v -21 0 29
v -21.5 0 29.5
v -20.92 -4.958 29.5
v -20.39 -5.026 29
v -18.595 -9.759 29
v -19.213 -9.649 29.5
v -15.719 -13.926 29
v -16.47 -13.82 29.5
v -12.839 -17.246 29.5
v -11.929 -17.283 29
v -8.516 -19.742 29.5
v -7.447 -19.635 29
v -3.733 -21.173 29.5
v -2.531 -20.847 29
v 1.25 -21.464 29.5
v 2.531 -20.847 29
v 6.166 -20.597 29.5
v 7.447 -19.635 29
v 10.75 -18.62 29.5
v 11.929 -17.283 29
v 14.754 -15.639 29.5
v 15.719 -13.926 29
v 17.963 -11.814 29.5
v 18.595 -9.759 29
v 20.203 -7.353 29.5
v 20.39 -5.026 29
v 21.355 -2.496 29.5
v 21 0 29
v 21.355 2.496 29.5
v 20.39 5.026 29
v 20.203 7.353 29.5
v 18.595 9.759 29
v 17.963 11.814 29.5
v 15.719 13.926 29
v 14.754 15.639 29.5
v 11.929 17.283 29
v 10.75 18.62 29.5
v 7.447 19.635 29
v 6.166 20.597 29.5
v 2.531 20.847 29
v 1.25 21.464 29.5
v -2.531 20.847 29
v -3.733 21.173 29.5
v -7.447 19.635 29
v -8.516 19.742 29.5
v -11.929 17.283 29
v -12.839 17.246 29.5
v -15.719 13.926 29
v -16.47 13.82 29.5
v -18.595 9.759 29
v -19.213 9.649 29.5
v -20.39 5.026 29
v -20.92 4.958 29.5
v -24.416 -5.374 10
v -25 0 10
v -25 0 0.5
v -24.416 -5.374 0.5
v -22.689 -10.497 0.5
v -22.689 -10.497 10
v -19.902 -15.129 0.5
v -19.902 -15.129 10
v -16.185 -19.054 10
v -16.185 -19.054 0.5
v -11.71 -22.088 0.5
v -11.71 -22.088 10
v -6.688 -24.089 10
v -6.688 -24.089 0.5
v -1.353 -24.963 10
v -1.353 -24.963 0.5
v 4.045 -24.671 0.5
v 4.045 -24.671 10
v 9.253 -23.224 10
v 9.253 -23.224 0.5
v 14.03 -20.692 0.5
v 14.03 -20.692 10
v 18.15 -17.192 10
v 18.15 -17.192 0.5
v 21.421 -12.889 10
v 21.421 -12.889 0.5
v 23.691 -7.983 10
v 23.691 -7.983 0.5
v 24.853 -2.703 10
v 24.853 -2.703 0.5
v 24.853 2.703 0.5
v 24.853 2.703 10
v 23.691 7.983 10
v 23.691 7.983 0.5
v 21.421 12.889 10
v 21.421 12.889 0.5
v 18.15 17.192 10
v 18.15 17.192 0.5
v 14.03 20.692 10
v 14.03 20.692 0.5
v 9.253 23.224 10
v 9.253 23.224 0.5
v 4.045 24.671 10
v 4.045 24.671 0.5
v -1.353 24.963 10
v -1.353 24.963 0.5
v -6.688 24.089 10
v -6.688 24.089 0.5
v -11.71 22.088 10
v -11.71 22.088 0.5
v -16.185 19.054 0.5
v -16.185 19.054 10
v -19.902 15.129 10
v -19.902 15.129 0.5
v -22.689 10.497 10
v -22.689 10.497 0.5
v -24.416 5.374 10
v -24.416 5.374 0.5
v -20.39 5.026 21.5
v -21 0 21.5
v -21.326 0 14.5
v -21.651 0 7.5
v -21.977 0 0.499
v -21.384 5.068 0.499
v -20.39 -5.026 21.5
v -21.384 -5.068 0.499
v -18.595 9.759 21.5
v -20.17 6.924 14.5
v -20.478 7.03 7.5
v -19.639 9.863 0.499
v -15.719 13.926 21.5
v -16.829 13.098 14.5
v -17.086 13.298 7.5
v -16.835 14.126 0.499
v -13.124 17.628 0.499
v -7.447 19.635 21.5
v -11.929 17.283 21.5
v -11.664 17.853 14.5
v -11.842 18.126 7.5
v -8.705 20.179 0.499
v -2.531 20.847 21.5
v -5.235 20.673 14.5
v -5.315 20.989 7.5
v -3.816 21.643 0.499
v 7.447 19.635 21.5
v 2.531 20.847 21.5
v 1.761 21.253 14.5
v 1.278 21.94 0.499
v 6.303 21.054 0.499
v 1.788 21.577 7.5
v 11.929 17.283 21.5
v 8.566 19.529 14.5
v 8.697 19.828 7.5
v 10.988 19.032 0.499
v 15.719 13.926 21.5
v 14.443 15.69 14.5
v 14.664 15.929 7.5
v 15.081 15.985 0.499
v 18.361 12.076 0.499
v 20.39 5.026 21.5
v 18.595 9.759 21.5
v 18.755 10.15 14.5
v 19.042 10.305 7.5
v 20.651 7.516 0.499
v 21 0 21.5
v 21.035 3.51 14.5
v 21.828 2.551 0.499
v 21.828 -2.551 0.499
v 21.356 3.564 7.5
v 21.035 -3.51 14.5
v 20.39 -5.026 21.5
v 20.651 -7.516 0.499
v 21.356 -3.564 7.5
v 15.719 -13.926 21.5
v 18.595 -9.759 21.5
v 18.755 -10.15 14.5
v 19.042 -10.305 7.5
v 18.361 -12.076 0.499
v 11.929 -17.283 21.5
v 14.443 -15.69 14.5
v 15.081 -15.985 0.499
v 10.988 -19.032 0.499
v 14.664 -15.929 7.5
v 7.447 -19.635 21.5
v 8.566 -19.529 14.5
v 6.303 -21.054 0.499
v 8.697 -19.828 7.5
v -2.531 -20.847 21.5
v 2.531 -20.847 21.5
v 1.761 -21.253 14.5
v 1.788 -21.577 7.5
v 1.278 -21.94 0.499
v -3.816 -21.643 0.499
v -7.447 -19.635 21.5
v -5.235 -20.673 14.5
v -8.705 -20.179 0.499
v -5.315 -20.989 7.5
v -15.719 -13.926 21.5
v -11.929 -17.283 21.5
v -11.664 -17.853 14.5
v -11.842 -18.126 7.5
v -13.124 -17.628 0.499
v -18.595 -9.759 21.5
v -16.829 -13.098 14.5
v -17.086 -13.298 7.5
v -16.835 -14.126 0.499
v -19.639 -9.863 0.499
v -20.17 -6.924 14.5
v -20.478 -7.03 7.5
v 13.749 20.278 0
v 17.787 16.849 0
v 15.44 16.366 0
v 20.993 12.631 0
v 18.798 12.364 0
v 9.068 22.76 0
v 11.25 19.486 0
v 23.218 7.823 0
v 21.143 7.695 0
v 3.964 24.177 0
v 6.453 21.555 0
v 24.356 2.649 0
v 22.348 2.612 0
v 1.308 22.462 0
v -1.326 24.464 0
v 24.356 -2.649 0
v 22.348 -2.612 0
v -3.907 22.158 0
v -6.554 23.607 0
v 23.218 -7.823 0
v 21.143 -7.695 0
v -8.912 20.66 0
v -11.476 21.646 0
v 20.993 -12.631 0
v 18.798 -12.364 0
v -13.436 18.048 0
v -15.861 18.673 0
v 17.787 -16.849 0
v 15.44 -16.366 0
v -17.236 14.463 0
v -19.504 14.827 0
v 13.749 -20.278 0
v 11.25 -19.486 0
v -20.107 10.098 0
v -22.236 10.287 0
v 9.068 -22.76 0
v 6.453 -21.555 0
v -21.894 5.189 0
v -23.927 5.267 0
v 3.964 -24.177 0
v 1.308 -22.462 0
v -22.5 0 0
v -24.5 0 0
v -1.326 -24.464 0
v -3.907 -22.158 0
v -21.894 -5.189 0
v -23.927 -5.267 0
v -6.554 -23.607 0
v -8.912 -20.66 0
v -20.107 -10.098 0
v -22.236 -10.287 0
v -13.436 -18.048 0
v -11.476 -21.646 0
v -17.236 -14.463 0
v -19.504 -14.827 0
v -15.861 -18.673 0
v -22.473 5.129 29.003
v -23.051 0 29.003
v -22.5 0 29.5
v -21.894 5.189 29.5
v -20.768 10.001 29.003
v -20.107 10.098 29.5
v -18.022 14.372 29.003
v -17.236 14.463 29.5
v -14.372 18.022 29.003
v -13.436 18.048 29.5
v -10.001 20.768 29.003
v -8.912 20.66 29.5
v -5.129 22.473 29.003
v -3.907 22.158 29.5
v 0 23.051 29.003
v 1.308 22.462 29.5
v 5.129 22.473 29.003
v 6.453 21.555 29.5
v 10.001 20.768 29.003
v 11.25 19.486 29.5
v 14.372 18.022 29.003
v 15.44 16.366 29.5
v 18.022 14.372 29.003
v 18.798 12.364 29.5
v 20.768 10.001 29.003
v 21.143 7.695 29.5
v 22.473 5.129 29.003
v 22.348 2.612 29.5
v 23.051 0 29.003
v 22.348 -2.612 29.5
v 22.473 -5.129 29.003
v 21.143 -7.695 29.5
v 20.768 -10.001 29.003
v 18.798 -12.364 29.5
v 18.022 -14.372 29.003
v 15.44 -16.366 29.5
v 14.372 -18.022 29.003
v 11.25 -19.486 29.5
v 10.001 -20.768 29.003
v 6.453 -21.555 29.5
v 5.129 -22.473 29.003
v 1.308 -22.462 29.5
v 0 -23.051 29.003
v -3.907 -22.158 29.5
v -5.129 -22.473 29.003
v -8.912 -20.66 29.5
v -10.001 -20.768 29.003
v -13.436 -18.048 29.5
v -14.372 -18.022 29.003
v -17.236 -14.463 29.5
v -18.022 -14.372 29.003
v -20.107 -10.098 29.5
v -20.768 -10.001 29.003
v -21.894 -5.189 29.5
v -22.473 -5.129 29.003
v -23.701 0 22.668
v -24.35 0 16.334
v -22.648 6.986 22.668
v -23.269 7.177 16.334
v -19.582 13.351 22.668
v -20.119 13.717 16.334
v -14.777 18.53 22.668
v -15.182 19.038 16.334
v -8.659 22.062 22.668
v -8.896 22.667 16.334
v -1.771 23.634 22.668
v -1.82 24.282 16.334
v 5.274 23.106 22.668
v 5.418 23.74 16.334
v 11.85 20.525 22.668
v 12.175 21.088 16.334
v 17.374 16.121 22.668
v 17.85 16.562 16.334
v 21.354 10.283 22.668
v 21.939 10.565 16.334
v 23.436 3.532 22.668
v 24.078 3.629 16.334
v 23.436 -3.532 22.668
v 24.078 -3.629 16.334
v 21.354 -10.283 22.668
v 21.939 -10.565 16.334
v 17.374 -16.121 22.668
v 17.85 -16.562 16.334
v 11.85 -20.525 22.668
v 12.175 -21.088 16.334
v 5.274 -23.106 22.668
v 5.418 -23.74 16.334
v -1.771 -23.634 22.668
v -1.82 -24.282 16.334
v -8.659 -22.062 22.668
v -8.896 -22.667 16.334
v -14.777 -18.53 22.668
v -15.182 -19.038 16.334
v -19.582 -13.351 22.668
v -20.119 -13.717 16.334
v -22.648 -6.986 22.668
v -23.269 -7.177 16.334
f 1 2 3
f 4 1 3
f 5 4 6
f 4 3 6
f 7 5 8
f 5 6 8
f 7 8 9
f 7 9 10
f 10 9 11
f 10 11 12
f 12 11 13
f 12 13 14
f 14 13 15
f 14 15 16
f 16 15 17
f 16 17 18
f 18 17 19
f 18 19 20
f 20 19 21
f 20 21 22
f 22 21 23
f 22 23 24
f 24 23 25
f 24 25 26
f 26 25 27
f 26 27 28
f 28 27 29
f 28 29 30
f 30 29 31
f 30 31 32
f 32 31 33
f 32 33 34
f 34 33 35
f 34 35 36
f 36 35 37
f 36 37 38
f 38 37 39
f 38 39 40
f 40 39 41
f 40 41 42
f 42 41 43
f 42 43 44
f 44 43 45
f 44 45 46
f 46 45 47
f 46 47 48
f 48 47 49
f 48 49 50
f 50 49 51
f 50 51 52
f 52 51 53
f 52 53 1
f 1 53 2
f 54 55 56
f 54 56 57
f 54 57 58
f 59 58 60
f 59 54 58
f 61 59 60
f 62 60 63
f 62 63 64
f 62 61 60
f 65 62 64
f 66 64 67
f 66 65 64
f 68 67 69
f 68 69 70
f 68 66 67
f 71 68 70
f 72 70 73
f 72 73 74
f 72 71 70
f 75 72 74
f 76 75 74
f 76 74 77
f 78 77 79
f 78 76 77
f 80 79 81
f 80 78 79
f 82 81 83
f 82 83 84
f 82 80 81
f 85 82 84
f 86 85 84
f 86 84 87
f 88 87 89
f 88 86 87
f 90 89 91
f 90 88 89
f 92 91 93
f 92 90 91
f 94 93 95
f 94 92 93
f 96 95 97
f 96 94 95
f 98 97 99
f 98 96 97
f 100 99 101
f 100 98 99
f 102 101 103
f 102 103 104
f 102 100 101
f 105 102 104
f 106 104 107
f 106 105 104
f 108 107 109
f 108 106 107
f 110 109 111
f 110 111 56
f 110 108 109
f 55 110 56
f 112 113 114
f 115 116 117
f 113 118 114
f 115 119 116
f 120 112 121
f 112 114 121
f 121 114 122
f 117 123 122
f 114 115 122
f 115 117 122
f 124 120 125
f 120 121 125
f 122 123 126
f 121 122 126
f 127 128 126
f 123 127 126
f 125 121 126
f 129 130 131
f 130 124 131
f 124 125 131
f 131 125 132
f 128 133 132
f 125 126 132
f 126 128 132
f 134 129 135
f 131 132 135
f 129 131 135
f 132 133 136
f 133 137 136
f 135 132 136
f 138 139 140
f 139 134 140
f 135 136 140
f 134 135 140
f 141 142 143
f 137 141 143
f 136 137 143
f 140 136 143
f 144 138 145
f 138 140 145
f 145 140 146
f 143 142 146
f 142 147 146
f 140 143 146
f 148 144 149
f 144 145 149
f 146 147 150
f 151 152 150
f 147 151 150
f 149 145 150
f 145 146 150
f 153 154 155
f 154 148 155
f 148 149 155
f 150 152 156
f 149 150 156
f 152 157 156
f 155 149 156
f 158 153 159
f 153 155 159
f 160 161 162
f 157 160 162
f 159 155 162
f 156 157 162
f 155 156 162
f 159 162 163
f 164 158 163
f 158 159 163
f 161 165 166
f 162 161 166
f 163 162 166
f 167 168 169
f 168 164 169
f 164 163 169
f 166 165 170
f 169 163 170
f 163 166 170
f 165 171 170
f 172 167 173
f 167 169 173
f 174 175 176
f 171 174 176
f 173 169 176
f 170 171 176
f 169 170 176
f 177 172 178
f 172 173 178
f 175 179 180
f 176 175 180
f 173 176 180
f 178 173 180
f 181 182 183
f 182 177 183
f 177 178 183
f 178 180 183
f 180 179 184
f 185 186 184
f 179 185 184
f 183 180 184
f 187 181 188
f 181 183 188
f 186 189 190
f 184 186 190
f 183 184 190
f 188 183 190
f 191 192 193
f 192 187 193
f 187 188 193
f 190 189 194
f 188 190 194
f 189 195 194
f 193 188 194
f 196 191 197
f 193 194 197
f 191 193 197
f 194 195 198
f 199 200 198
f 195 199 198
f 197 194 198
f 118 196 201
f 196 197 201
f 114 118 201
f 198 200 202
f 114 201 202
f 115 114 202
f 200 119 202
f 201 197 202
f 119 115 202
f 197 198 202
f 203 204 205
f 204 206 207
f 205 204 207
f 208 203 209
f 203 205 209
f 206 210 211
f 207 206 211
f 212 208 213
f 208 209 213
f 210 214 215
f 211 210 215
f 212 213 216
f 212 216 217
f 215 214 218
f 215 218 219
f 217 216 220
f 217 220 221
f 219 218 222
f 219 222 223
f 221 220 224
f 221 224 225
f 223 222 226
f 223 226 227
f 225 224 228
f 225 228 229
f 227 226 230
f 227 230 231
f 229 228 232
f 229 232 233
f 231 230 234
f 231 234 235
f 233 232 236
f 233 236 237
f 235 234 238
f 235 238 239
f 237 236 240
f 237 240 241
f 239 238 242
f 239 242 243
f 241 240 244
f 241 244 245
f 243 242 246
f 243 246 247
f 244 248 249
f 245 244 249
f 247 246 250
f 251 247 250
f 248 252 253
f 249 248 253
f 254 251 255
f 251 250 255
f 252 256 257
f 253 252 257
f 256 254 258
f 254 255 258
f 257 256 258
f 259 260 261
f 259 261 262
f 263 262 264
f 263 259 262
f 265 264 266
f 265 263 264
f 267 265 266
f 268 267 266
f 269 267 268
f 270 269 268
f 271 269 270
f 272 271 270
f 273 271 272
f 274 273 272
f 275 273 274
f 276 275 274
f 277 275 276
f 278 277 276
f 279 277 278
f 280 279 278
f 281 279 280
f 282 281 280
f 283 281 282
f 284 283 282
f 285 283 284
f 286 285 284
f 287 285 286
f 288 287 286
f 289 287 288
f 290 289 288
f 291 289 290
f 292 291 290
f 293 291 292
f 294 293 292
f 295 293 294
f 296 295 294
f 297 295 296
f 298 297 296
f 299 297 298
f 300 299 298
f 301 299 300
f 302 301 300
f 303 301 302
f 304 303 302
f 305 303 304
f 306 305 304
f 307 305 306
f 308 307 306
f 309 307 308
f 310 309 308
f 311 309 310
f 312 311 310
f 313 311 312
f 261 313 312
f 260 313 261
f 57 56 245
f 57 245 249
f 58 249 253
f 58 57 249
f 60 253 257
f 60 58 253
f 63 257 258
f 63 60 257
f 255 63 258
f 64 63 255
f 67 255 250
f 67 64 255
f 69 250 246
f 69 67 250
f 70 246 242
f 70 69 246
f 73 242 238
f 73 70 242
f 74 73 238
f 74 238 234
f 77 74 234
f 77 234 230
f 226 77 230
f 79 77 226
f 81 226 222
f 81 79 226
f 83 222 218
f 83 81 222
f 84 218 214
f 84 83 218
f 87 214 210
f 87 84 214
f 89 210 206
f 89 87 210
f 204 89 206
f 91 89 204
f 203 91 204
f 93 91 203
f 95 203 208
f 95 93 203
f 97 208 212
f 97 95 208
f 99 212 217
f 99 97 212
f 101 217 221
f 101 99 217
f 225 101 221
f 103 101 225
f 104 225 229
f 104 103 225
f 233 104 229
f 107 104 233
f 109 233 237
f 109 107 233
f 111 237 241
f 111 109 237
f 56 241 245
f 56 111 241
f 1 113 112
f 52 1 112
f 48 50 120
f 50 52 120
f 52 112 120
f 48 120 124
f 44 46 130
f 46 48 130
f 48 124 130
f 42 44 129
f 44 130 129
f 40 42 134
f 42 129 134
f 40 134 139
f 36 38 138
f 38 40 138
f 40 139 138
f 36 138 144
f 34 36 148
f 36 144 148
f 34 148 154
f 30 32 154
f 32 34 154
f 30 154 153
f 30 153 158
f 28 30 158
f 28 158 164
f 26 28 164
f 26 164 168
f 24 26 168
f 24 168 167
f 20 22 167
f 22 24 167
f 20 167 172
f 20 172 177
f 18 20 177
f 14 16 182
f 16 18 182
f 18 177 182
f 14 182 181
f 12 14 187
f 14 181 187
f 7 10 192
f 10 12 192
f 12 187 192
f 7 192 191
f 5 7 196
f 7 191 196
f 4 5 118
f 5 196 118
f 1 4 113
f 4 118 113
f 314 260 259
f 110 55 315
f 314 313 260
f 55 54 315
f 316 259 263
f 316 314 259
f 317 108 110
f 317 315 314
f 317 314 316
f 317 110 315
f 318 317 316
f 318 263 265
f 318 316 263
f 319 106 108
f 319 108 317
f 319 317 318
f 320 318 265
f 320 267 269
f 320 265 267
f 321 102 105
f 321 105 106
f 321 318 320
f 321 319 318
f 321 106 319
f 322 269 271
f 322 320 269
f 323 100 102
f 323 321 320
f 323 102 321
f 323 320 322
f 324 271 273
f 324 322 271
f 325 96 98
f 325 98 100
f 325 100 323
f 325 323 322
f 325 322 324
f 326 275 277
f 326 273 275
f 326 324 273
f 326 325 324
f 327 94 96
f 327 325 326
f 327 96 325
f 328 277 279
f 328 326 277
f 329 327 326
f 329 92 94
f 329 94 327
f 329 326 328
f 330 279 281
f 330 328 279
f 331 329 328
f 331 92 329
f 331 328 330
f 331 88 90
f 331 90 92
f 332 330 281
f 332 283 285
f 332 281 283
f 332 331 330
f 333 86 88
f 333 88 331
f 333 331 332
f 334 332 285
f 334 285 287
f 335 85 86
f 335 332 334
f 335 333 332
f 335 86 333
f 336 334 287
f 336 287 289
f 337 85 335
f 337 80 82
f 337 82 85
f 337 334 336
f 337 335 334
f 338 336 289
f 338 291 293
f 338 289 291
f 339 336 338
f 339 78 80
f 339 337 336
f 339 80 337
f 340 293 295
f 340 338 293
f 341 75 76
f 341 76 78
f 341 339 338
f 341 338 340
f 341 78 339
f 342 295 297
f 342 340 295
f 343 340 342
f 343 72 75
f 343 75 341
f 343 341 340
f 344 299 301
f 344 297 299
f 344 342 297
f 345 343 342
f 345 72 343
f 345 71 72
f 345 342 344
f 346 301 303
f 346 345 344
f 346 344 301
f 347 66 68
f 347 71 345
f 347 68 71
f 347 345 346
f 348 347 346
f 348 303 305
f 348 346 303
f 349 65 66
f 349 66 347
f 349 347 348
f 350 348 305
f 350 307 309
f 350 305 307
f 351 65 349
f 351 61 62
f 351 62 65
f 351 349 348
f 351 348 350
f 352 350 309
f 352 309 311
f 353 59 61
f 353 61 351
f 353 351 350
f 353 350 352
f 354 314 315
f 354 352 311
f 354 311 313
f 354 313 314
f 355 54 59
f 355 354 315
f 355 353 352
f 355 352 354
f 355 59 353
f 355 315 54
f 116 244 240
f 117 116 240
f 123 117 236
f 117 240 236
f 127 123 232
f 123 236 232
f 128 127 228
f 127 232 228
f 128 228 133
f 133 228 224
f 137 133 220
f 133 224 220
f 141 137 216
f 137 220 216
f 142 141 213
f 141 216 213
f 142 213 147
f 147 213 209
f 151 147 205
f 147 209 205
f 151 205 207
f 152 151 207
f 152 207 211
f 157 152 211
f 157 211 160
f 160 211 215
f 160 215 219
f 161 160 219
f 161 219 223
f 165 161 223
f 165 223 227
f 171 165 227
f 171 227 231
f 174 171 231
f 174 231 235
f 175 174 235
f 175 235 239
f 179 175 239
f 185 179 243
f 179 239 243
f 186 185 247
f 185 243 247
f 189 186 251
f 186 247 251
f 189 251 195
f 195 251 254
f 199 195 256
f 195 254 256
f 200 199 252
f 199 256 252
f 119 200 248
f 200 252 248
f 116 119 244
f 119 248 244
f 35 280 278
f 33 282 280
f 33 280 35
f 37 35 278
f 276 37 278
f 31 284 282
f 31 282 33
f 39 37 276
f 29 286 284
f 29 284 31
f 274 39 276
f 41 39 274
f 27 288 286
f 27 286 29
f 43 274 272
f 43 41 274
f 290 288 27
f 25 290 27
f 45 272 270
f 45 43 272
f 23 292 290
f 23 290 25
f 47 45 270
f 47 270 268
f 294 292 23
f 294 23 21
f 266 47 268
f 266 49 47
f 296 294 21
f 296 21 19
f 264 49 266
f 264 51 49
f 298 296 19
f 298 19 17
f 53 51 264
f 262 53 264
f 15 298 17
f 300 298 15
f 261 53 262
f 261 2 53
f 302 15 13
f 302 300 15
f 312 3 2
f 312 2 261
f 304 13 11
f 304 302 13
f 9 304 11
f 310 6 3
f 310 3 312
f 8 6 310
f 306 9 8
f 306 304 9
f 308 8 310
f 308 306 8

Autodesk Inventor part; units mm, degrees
ref_plane "YZ Plane" through (0, 0, 0) normal (1, 0, 0) x (0, 1, 0)
ref_plane "XZ Plane" through (0, 0, 0) normal (0, 1, 0) x (-1, 0, 0)
ref_plane "XY Plane" through (0, 0, 0) normal (0, 0, 1) x (1, 0, 0)
sketch "Sketch1" plane through (0, 0, 0) normal (0, 1, 0) x (-1, 0, 0)
  line L0 (0, 0) -> (0, 29.5)
  line L1 (25, 0) -> (25, 10)
  line L2 (25, 10) -> (23, 29.5)
  line L3 (23, 29.5) -> (21, 29.5)
  line L4 (22, 0) -> (25, 0)
  line L5 (0, 0) -> (22, 0) construction
  line L6 (21, 29.5) -> (0, 29.5) construction
  line L7 (21, 29.5) -> (21, 21.5)
  line L8 (21, 21.5) -> (22, 0)
  dimension "d0" = 50
  dimension "d1" = 42
  dimension "d2" = 29.5
  dimension "d3" = 10
  dimension "d4" = 8
  dimension "d11" = 3
  dimension "d12" = 2
revolve "Revolution1" add sketch "Sketch1" angle 360 about axis through (0, 0, 0) along (0, 0, 1)
chamfer "Chamfer1" distance 0.5 angle 45 4 edges at (25, 0, 0) (22, 0, 0) (23, 0, 29.5) (21, 0, 29.5)
properties part number "TakumarSpacer" material "ABS Plastic"
